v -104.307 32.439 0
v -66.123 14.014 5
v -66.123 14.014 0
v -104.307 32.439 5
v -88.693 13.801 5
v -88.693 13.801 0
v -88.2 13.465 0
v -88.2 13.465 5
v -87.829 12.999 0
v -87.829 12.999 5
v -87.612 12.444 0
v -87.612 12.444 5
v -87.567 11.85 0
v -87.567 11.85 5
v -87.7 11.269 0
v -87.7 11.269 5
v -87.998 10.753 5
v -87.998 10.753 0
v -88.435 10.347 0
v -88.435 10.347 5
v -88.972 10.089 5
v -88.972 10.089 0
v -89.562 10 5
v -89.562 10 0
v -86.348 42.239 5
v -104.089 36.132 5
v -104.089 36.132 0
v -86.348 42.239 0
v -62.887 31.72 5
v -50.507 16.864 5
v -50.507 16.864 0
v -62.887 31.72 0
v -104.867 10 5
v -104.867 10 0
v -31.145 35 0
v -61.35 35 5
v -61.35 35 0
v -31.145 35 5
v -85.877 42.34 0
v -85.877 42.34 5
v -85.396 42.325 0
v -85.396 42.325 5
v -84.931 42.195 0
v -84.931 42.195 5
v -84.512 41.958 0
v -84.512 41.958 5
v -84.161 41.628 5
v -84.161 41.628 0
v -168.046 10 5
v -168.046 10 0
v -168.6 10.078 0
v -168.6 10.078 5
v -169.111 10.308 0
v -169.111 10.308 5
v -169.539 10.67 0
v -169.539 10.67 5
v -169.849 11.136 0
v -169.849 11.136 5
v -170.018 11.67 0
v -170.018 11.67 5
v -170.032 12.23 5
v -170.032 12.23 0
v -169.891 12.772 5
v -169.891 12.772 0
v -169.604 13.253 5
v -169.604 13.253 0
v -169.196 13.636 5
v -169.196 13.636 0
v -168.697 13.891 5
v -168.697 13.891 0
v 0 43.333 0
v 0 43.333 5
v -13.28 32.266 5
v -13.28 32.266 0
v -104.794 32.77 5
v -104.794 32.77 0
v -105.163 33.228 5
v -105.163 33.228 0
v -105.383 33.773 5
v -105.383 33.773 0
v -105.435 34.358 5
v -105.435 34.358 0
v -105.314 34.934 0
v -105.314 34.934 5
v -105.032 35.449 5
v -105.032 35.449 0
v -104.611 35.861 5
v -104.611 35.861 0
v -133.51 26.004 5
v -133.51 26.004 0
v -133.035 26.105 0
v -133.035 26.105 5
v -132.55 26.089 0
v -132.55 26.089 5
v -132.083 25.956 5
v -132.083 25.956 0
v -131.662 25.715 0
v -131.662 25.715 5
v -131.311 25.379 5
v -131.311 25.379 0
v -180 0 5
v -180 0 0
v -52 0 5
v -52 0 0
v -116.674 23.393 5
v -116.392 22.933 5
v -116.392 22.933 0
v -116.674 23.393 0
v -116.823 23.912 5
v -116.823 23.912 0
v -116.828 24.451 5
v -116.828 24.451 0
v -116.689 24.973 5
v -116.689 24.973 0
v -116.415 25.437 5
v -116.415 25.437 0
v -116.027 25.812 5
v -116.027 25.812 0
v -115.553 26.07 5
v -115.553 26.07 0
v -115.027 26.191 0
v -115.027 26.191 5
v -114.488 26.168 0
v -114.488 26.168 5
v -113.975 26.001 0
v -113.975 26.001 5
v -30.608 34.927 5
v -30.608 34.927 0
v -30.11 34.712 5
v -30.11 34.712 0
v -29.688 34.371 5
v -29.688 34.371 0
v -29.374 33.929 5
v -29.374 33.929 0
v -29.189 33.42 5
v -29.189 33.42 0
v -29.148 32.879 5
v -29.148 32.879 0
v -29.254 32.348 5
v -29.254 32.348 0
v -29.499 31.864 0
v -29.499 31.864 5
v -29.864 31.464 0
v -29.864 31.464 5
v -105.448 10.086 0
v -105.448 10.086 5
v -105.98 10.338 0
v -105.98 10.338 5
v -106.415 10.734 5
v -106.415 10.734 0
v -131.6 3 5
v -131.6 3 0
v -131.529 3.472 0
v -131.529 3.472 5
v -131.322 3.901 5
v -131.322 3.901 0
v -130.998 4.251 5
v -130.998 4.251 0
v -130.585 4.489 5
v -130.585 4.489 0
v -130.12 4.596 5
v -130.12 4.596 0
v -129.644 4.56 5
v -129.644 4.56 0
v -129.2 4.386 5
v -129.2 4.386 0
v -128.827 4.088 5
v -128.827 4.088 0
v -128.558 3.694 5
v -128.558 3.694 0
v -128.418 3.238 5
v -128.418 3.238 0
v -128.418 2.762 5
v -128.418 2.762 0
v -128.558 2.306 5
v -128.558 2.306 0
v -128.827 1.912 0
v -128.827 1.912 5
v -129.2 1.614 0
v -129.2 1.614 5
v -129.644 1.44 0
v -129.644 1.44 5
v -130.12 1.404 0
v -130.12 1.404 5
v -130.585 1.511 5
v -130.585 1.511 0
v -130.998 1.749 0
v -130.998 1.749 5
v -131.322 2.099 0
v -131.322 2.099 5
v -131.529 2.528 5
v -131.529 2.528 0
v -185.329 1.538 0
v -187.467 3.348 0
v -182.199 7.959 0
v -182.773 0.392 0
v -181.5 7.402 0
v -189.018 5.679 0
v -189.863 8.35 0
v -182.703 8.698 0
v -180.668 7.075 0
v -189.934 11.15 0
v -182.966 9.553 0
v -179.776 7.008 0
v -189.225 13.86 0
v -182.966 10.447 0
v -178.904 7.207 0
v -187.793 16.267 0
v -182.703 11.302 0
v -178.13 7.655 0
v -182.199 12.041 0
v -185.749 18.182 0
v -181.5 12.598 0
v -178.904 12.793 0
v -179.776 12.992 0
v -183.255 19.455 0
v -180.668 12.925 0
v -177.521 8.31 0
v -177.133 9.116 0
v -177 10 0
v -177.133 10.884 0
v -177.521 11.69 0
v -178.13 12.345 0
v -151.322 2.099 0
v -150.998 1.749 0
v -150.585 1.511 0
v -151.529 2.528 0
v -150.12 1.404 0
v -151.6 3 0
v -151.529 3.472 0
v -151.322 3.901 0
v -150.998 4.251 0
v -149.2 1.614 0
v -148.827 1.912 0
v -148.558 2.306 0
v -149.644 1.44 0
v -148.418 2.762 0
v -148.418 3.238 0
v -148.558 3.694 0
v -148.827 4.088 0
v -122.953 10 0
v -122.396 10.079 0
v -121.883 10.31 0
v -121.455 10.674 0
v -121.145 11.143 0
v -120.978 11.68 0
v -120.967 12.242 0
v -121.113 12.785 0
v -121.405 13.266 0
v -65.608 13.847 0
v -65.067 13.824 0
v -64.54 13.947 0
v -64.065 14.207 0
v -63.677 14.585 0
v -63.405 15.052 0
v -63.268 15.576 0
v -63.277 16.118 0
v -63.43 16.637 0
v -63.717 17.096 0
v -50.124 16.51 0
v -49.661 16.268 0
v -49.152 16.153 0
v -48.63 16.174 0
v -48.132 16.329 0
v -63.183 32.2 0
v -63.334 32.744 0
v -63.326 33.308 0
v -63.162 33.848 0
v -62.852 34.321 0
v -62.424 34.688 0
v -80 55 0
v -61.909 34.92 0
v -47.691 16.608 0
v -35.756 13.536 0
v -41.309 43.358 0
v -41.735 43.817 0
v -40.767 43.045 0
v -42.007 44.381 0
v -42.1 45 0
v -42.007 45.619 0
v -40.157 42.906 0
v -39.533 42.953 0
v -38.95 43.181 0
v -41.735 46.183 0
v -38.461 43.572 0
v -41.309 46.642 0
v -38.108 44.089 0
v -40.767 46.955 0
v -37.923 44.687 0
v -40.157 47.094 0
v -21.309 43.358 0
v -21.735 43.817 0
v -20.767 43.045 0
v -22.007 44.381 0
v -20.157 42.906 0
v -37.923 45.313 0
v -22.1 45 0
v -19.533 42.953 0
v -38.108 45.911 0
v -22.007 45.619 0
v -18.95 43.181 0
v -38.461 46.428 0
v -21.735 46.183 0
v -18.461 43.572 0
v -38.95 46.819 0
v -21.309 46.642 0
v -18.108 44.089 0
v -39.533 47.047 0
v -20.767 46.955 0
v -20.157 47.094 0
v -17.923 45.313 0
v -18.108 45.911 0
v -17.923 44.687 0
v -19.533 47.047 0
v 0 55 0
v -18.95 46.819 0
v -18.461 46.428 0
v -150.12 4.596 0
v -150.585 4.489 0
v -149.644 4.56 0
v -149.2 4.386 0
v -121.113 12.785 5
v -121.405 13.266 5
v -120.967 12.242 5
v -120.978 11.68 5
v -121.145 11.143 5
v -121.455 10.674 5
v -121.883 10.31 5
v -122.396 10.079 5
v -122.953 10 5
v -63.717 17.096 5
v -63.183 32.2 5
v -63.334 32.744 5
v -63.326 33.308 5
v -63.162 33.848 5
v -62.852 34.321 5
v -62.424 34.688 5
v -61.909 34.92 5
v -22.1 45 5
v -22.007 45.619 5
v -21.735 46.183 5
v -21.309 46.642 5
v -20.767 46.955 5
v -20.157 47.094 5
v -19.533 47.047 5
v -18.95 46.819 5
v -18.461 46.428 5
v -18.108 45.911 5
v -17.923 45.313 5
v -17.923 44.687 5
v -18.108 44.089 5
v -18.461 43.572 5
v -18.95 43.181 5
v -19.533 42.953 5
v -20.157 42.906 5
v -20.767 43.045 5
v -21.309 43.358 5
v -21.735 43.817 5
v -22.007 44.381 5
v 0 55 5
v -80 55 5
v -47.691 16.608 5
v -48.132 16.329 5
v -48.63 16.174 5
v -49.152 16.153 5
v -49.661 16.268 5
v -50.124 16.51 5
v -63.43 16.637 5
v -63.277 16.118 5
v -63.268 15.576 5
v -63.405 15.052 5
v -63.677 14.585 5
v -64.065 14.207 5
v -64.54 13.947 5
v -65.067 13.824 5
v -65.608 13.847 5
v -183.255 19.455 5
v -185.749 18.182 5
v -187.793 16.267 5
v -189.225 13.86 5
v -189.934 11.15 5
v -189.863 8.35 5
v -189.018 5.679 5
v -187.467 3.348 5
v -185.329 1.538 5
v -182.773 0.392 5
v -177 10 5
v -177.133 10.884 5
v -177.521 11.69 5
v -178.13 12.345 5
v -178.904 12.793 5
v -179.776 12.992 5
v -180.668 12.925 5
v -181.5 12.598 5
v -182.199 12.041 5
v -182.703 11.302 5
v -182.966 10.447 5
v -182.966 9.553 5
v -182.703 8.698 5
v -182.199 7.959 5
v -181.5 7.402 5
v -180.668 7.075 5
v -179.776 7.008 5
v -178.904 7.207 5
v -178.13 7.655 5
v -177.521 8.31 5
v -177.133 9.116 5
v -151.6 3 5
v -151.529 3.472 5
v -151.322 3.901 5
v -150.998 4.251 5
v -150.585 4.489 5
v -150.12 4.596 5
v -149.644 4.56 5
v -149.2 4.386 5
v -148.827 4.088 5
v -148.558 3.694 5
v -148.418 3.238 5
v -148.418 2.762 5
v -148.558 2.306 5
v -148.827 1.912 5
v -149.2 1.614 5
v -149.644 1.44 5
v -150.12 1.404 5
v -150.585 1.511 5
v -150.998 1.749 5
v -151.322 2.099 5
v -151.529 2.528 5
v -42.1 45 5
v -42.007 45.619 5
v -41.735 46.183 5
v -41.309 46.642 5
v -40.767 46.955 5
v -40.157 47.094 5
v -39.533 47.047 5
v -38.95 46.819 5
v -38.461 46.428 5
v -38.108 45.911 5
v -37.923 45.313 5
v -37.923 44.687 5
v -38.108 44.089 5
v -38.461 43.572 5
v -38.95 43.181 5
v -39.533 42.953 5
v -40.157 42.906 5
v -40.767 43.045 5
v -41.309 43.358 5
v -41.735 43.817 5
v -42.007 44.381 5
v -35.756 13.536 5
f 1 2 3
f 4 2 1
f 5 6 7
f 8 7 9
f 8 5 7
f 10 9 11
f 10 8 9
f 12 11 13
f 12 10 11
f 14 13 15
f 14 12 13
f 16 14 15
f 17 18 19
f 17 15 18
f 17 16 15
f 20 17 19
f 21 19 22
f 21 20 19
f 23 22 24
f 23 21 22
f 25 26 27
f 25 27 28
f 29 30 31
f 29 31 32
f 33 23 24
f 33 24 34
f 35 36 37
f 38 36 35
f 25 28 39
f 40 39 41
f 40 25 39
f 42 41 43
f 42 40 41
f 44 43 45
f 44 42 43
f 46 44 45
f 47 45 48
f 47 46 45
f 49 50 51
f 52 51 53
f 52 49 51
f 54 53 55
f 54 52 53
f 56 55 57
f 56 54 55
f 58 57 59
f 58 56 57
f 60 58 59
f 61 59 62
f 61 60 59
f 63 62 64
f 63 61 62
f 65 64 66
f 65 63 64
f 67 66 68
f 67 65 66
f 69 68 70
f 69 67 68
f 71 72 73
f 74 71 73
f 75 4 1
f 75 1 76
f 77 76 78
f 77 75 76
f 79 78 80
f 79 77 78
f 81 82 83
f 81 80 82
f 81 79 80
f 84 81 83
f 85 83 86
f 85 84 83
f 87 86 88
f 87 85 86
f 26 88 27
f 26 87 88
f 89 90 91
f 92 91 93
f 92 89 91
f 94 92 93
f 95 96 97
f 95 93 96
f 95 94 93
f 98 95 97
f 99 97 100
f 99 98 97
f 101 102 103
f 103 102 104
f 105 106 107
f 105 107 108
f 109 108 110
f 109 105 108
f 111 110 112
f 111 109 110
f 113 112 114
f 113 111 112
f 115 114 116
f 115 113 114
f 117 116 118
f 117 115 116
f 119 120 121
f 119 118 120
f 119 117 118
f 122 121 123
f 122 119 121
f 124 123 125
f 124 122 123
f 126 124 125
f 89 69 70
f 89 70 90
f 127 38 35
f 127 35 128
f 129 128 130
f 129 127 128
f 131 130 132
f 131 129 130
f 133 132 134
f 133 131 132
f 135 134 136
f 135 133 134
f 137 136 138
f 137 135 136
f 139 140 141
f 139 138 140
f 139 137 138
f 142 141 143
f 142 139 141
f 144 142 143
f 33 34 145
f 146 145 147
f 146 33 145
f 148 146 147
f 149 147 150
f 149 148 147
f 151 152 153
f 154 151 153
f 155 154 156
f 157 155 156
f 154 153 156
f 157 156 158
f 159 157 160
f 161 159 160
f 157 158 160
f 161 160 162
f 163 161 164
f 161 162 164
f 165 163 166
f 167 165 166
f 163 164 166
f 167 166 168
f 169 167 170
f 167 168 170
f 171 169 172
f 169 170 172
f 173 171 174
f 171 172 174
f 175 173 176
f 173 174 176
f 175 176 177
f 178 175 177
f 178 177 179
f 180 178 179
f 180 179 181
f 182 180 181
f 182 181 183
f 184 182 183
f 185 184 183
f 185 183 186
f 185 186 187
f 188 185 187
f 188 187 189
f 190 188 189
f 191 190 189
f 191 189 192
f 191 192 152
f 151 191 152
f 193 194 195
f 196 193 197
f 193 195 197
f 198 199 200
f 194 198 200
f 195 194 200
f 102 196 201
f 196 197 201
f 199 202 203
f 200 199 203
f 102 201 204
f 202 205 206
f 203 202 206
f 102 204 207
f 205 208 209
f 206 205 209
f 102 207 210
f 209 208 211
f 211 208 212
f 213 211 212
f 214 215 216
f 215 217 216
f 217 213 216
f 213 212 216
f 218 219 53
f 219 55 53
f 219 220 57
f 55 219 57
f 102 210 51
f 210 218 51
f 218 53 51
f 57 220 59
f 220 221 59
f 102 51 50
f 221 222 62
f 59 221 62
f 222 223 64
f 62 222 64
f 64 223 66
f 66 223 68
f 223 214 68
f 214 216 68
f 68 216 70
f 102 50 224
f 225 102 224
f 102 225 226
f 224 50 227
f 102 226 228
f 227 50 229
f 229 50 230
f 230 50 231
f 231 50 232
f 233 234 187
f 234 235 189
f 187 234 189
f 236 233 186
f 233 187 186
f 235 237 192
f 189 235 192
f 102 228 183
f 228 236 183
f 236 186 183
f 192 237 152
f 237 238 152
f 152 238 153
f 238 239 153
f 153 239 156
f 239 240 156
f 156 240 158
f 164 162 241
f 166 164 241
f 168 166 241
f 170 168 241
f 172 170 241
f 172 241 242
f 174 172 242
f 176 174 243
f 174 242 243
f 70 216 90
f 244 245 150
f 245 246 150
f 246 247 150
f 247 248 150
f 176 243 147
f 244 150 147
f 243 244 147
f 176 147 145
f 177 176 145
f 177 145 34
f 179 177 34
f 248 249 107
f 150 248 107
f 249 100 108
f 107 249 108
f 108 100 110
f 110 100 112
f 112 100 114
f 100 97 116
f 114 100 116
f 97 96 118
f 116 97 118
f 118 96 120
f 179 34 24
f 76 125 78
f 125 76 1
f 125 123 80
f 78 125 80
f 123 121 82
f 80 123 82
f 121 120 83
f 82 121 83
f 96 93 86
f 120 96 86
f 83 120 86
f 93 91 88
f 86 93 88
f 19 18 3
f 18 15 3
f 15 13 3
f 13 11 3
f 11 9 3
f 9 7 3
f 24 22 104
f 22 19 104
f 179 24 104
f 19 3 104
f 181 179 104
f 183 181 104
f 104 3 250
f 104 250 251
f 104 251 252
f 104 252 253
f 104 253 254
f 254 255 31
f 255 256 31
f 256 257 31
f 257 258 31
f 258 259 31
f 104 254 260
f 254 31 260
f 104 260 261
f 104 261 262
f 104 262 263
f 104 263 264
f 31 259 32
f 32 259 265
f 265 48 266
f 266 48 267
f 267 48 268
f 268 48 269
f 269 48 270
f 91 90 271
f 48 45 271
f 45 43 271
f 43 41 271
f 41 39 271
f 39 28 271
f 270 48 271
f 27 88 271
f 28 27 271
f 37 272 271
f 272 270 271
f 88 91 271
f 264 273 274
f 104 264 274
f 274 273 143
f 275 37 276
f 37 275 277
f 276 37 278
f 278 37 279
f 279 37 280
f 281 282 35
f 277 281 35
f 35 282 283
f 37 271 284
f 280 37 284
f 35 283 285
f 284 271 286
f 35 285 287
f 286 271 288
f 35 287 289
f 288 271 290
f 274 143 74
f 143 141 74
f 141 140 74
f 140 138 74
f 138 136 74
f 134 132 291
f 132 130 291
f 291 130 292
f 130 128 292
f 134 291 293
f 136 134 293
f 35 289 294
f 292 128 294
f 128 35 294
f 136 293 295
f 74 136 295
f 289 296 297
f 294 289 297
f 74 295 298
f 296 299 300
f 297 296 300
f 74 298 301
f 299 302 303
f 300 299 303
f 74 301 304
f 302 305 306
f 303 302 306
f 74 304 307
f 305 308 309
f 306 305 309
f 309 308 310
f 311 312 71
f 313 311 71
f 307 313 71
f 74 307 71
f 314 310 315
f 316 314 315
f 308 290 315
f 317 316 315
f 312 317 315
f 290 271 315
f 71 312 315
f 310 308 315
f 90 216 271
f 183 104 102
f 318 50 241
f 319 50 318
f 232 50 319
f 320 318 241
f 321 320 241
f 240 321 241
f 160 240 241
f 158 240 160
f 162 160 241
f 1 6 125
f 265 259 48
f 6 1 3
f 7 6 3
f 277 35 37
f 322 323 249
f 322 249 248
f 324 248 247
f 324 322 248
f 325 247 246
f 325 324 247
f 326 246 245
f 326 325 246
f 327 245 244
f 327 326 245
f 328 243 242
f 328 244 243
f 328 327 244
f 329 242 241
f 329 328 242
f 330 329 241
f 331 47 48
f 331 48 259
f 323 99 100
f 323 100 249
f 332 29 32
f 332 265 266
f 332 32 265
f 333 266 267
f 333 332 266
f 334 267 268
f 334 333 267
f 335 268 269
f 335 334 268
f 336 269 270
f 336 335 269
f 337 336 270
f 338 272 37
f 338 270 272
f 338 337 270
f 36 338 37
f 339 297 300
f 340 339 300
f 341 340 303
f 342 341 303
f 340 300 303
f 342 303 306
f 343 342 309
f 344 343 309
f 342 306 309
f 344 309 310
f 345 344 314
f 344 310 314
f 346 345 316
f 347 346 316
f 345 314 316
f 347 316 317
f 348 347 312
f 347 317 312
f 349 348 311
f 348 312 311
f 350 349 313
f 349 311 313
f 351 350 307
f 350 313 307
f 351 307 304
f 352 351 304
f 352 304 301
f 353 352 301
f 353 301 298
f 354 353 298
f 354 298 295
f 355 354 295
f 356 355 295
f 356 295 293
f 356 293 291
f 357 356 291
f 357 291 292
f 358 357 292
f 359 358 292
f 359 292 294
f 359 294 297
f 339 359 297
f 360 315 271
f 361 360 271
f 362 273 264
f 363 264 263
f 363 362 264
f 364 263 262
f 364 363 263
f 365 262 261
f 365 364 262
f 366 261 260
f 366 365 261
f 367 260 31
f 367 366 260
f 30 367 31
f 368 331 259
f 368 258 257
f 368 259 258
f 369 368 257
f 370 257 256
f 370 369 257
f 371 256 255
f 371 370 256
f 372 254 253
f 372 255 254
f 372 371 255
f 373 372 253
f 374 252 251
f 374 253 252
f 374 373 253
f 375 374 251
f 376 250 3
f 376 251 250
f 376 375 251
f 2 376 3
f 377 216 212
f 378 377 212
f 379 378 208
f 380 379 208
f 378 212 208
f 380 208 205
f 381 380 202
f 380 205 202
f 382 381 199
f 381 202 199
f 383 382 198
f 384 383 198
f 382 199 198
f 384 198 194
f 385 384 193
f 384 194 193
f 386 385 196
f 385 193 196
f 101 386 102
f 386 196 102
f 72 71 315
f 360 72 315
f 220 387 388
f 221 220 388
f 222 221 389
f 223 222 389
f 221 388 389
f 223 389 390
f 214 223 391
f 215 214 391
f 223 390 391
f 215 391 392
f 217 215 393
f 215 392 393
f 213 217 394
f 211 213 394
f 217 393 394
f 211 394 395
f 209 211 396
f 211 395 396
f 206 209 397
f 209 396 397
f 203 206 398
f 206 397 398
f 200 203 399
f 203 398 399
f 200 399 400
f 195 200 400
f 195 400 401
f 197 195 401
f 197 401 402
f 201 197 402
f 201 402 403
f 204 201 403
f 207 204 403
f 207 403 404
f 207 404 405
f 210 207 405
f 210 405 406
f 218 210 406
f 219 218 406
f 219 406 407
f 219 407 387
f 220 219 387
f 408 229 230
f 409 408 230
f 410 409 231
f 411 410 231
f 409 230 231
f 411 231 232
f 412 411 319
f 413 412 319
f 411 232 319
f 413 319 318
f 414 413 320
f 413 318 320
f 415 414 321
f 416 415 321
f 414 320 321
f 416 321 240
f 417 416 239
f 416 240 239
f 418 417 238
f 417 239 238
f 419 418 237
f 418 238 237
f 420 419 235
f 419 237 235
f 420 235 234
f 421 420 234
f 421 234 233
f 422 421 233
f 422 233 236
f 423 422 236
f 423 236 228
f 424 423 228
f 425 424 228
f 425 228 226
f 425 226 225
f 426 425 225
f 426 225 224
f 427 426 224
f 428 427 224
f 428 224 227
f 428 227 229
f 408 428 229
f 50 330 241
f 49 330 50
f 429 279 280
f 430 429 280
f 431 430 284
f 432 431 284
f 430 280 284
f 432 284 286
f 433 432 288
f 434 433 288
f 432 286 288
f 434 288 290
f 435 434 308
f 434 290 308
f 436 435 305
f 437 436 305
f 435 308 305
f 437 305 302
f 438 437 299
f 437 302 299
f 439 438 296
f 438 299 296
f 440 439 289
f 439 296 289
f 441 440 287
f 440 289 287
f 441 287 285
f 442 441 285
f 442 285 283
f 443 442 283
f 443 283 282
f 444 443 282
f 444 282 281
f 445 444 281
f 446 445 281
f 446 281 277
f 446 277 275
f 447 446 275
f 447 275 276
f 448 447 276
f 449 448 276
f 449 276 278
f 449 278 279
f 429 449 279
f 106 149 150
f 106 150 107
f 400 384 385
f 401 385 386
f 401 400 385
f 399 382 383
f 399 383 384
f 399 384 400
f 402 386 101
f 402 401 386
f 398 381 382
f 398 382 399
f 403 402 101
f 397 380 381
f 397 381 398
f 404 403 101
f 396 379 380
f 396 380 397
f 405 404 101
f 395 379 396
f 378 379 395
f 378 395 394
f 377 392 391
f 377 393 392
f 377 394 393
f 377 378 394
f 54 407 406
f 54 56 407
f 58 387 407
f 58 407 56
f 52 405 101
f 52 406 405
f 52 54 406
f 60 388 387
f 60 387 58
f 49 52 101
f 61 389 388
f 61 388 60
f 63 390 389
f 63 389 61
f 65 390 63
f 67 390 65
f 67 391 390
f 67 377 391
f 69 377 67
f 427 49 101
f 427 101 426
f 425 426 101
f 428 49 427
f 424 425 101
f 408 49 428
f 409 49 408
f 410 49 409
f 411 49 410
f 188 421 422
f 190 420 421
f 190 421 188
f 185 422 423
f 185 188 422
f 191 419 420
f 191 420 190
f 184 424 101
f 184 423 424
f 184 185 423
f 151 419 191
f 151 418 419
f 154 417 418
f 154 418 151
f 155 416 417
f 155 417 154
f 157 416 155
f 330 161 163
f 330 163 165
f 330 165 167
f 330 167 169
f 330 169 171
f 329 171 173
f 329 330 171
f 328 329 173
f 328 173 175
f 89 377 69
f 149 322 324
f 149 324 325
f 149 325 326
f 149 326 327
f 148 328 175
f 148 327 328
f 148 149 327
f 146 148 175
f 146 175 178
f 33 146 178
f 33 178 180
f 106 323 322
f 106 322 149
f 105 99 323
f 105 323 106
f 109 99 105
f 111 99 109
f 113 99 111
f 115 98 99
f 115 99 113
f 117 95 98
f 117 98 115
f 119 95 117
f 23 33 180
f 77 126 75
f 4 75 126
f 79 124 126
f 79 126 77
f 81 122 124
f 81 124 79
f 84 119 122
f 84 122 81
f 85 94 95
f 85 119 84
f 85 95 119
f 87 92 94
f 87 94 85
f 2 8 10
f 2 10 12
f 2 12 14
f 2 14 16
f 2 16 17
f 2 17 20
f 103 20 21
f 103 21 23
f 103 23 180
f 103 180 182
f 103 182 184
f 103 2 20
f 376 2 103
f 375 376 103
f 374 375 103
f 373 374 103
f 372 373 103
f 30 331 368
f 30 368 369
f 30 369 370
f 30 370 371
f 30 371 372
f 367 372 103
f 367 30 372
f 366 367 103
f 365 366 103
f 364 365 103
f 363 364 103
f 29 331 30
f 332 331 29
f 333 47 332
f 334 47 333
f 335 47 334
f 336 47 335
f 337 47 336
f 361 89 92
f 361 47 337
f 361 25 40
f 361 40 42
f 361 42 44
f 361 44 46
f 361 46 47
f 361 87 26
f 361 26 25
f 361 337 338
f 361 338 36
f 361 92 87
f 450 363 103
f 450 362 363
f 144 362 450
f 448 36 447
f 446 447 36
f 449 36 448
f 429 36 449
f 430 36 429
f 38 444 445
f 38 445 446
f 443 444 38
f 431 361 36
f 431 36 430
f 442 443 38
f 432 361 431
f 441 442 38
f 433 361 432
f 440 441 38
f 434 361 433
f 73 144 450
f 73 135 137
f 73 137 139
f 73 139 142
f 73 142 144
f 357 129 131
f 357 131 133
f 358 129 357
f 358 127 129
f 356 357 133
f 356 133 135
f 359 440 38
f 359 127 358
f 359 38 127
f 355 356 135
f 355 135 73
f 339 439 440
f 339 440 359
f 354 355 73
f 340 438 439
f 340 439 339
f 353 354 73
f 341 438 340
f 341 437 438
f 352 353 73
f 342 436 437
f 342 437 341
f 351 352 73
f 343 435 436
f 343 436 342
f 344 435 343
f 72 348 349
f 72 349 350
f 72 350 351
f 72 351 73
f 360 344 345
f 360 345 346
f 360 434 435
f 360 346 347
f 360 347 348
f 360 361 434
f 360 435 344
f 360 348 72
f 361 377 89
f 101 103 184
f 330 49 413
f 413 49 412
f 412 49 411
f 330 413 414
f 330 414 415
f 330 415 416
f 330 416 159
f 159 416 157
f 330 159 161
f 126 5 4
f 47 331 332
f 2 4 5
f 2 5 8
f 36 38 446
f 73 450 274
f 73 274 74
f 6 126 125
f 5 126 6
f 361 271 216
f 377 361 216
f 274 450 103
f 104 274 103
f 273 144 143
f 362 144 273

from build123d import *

# Parameters (mm, degrees)
EXTRUDE_1_DEPTH         = 5
SKETCH_2_R              = 3
CUT_EXTRUDE_1_DEPTH     = 198.863589374
CUT_EXTRUDE_2_DEPTH     = 198.863589374
HOLE_WIZARD_3_2_3_2_1_D = 3.2
HOLE_WIZARD_4_2_4_2_1_D = 4.2
CUT_EXTRUDE_3_DEPTH     = 198.863589374


with BuildPart() as part:
    # 草图1 → 凸台-拉伸1 (new body)
    with BuildSketch(Plane.XY):
        with BuildLine():
            Line((0, 0), (0, 55))
            Line((0, 55), (-80, 55))
            Line((-80, 55), (-183.254947339, 19.455438531))
            ThreePointArc((-183.254947339, 19.455438531), (-189.862920088, 8.349906868), (-180, 0))
            Line((-180, 0), (0, 0))
        make_face()
    extrude(amount=EXTRUDE_1_DEPTH)

    # 草图2 → 切除-拉伸1 (cut, through all)
    with BuildSketch(Plane.XY.offset(5)):
        with Locations((-180, 10)):
            Circle(SKETCH_2_R)
    extrude(amount=-CUT_EXTRUDE_1_DEPTH, mode=Mode.SUBTRACT)

    # 草图3 → 切除-拉伸2 (cut, through all)
    with BuildSketch(Plane.XY.offset(5)):
        with BuildLine():
            Line((-113.975045622, 26.000798899), (-88.692623676, 13.801264258))
            ThreePointArc((-88.692623676, 13.801264258), (-87.612105141, 11.554202129), (-89.561788258, 10))
            Line((-89.561788258, 10), (-104.866847196, 10))
            ThreePointArc((-104.866847196, 10), (-105.72348841, 10.192746329), (-106.415015174, 10.733834169))
            Line((-106.415015174, 10.733834169), (-116.392378182, 22.93336881))
            ThreePointArc((-116.392378182, 22.93336881), (-116.415051775, 25.437459016), (-113.975045622, 26.000798899))
        make_face()
        with BuildLine():
            Line((-168.696609563, 13.891087706), (-133.510036225, 26.003740428))
            ThreePointArc((-133.510036225, 26.003740428), (-132.31236206, 26.036486353), (-131.310878779, 25.378818552))
            Line((-131.310878779, 25.378818552), (-121.40457196, 13.266165831))
            ThreePointArc((-121.40457196, 13.266165831), (-121.145486268, 11.143358786), (-122.952739938, 10))
            Line((-122.952739938, 10), (-168.045620095, 10))
            ThreePointArc((-168.045620095, 10), (-170.018204112, 11.669981374), (-168.696609563, 13.891087706))
        make_face()
        with BuildLine():
            Line((-10, 30.729916775), (-10, 12))
            ThreePointArc((-10, 12), (-10.585786438, 10.585786438), (-12, 10))
            Line((-12, 10), (-34.47590013, 10))
            ThreePointArc((-34.47590013, 10), (-36.356443285, 11.319149472), (-35.756268929, 13.536442559))
            Line((-35.756268929, 13.536442559), (-13.280368799, 32.266359334))
            ThreePointArc((-13.280368799, 32.266359334), (-11.151689208, 32.541095617), (-10, 30.729916775))
        make_face()
        with BuildLine():
            Line((-61.350416127, 35), (-31.144599222, 35))
            ThreePointArc((-31.144599222, 35), (-29.264056067, 33.680850528), (-29.864230423, 31.463557441))
            Line((-29.864230423, 31.463557441), (-47.69061417, 16.608237652))
            ThreePointArc((-47.69061417, 16.608237652), (-49.152054461, 16.152893798), (-50.507425528, 16.864311412))
            Line((-50.507425528, 16.864311412), (-62.886858686, 31.719631201))
            ThreePointArc((-62.886858686, 31.719631201), (-63.161594969, 33.848310792), (-61.350416127, 35))
        make_face()
        with BuildLine():
            Line((-84.16091357, 41.62799771), (-63.717267008, 17.095621836))
            ThreePointArc((-63.717267008, 17.095621836), (-63.677184734, 14.584574586), (-66.12287415, 14.013988778))
            Line((-66.12287415, 14.013988778), (-104.307462185, 32.43920949))
            ThreePointArc((-104.307462185, 32.43920949), (-105.434815281, 34.358444754), (-104.08928707, 36.131561455))
            Line((-104.08928707, 36.131561455), (-86.348345597, 42.238716617))
            ThreePointArc((-86.348345597, 42.238716617), (-85.15953535, 42.273959311), (-84.16091357, 41.62799771))
        make_face()
    extrude(amount=-CUT_EXTRUDE_2_DEPTH, mode=Mode.SUBTRACT)

    # Ø3.2 (3.2) 直径孔1 (through all)
    with Locations(Plane(origin=(-150, 3, 5), x_dir=(1, 0, 0), z_dir=(0, 0, 1))):
        with Locations((0, 0), (20, 0)):
            Hole(HOLE_WIZARD_3_2_3_2_1_D / 2)

    # Ø4.2 (4.2) 直径孔1 (through all)
    with Locations(Plane(origin=(-40, 45, 5), x_dir=(1, 0, 0), z_dir=(0, 0, 1))):
        with Locations((0, 0), (20, 0)):
            Hole(HOLE_WIZARD_4_2_4_2_1_D / 2)

    # 草图8 → 切除-拉伸3 (cut, through all)
    with BuildSketch(Plane.XY.offset(5)):
        Polygon((0, 0), (0, 43.333333333), (-52, 0), align=None)
    extrude(amount=-CUT_EXTRUDE_3_DEPTH, mode=Mode.SUBTRACT)


solid = part.part
